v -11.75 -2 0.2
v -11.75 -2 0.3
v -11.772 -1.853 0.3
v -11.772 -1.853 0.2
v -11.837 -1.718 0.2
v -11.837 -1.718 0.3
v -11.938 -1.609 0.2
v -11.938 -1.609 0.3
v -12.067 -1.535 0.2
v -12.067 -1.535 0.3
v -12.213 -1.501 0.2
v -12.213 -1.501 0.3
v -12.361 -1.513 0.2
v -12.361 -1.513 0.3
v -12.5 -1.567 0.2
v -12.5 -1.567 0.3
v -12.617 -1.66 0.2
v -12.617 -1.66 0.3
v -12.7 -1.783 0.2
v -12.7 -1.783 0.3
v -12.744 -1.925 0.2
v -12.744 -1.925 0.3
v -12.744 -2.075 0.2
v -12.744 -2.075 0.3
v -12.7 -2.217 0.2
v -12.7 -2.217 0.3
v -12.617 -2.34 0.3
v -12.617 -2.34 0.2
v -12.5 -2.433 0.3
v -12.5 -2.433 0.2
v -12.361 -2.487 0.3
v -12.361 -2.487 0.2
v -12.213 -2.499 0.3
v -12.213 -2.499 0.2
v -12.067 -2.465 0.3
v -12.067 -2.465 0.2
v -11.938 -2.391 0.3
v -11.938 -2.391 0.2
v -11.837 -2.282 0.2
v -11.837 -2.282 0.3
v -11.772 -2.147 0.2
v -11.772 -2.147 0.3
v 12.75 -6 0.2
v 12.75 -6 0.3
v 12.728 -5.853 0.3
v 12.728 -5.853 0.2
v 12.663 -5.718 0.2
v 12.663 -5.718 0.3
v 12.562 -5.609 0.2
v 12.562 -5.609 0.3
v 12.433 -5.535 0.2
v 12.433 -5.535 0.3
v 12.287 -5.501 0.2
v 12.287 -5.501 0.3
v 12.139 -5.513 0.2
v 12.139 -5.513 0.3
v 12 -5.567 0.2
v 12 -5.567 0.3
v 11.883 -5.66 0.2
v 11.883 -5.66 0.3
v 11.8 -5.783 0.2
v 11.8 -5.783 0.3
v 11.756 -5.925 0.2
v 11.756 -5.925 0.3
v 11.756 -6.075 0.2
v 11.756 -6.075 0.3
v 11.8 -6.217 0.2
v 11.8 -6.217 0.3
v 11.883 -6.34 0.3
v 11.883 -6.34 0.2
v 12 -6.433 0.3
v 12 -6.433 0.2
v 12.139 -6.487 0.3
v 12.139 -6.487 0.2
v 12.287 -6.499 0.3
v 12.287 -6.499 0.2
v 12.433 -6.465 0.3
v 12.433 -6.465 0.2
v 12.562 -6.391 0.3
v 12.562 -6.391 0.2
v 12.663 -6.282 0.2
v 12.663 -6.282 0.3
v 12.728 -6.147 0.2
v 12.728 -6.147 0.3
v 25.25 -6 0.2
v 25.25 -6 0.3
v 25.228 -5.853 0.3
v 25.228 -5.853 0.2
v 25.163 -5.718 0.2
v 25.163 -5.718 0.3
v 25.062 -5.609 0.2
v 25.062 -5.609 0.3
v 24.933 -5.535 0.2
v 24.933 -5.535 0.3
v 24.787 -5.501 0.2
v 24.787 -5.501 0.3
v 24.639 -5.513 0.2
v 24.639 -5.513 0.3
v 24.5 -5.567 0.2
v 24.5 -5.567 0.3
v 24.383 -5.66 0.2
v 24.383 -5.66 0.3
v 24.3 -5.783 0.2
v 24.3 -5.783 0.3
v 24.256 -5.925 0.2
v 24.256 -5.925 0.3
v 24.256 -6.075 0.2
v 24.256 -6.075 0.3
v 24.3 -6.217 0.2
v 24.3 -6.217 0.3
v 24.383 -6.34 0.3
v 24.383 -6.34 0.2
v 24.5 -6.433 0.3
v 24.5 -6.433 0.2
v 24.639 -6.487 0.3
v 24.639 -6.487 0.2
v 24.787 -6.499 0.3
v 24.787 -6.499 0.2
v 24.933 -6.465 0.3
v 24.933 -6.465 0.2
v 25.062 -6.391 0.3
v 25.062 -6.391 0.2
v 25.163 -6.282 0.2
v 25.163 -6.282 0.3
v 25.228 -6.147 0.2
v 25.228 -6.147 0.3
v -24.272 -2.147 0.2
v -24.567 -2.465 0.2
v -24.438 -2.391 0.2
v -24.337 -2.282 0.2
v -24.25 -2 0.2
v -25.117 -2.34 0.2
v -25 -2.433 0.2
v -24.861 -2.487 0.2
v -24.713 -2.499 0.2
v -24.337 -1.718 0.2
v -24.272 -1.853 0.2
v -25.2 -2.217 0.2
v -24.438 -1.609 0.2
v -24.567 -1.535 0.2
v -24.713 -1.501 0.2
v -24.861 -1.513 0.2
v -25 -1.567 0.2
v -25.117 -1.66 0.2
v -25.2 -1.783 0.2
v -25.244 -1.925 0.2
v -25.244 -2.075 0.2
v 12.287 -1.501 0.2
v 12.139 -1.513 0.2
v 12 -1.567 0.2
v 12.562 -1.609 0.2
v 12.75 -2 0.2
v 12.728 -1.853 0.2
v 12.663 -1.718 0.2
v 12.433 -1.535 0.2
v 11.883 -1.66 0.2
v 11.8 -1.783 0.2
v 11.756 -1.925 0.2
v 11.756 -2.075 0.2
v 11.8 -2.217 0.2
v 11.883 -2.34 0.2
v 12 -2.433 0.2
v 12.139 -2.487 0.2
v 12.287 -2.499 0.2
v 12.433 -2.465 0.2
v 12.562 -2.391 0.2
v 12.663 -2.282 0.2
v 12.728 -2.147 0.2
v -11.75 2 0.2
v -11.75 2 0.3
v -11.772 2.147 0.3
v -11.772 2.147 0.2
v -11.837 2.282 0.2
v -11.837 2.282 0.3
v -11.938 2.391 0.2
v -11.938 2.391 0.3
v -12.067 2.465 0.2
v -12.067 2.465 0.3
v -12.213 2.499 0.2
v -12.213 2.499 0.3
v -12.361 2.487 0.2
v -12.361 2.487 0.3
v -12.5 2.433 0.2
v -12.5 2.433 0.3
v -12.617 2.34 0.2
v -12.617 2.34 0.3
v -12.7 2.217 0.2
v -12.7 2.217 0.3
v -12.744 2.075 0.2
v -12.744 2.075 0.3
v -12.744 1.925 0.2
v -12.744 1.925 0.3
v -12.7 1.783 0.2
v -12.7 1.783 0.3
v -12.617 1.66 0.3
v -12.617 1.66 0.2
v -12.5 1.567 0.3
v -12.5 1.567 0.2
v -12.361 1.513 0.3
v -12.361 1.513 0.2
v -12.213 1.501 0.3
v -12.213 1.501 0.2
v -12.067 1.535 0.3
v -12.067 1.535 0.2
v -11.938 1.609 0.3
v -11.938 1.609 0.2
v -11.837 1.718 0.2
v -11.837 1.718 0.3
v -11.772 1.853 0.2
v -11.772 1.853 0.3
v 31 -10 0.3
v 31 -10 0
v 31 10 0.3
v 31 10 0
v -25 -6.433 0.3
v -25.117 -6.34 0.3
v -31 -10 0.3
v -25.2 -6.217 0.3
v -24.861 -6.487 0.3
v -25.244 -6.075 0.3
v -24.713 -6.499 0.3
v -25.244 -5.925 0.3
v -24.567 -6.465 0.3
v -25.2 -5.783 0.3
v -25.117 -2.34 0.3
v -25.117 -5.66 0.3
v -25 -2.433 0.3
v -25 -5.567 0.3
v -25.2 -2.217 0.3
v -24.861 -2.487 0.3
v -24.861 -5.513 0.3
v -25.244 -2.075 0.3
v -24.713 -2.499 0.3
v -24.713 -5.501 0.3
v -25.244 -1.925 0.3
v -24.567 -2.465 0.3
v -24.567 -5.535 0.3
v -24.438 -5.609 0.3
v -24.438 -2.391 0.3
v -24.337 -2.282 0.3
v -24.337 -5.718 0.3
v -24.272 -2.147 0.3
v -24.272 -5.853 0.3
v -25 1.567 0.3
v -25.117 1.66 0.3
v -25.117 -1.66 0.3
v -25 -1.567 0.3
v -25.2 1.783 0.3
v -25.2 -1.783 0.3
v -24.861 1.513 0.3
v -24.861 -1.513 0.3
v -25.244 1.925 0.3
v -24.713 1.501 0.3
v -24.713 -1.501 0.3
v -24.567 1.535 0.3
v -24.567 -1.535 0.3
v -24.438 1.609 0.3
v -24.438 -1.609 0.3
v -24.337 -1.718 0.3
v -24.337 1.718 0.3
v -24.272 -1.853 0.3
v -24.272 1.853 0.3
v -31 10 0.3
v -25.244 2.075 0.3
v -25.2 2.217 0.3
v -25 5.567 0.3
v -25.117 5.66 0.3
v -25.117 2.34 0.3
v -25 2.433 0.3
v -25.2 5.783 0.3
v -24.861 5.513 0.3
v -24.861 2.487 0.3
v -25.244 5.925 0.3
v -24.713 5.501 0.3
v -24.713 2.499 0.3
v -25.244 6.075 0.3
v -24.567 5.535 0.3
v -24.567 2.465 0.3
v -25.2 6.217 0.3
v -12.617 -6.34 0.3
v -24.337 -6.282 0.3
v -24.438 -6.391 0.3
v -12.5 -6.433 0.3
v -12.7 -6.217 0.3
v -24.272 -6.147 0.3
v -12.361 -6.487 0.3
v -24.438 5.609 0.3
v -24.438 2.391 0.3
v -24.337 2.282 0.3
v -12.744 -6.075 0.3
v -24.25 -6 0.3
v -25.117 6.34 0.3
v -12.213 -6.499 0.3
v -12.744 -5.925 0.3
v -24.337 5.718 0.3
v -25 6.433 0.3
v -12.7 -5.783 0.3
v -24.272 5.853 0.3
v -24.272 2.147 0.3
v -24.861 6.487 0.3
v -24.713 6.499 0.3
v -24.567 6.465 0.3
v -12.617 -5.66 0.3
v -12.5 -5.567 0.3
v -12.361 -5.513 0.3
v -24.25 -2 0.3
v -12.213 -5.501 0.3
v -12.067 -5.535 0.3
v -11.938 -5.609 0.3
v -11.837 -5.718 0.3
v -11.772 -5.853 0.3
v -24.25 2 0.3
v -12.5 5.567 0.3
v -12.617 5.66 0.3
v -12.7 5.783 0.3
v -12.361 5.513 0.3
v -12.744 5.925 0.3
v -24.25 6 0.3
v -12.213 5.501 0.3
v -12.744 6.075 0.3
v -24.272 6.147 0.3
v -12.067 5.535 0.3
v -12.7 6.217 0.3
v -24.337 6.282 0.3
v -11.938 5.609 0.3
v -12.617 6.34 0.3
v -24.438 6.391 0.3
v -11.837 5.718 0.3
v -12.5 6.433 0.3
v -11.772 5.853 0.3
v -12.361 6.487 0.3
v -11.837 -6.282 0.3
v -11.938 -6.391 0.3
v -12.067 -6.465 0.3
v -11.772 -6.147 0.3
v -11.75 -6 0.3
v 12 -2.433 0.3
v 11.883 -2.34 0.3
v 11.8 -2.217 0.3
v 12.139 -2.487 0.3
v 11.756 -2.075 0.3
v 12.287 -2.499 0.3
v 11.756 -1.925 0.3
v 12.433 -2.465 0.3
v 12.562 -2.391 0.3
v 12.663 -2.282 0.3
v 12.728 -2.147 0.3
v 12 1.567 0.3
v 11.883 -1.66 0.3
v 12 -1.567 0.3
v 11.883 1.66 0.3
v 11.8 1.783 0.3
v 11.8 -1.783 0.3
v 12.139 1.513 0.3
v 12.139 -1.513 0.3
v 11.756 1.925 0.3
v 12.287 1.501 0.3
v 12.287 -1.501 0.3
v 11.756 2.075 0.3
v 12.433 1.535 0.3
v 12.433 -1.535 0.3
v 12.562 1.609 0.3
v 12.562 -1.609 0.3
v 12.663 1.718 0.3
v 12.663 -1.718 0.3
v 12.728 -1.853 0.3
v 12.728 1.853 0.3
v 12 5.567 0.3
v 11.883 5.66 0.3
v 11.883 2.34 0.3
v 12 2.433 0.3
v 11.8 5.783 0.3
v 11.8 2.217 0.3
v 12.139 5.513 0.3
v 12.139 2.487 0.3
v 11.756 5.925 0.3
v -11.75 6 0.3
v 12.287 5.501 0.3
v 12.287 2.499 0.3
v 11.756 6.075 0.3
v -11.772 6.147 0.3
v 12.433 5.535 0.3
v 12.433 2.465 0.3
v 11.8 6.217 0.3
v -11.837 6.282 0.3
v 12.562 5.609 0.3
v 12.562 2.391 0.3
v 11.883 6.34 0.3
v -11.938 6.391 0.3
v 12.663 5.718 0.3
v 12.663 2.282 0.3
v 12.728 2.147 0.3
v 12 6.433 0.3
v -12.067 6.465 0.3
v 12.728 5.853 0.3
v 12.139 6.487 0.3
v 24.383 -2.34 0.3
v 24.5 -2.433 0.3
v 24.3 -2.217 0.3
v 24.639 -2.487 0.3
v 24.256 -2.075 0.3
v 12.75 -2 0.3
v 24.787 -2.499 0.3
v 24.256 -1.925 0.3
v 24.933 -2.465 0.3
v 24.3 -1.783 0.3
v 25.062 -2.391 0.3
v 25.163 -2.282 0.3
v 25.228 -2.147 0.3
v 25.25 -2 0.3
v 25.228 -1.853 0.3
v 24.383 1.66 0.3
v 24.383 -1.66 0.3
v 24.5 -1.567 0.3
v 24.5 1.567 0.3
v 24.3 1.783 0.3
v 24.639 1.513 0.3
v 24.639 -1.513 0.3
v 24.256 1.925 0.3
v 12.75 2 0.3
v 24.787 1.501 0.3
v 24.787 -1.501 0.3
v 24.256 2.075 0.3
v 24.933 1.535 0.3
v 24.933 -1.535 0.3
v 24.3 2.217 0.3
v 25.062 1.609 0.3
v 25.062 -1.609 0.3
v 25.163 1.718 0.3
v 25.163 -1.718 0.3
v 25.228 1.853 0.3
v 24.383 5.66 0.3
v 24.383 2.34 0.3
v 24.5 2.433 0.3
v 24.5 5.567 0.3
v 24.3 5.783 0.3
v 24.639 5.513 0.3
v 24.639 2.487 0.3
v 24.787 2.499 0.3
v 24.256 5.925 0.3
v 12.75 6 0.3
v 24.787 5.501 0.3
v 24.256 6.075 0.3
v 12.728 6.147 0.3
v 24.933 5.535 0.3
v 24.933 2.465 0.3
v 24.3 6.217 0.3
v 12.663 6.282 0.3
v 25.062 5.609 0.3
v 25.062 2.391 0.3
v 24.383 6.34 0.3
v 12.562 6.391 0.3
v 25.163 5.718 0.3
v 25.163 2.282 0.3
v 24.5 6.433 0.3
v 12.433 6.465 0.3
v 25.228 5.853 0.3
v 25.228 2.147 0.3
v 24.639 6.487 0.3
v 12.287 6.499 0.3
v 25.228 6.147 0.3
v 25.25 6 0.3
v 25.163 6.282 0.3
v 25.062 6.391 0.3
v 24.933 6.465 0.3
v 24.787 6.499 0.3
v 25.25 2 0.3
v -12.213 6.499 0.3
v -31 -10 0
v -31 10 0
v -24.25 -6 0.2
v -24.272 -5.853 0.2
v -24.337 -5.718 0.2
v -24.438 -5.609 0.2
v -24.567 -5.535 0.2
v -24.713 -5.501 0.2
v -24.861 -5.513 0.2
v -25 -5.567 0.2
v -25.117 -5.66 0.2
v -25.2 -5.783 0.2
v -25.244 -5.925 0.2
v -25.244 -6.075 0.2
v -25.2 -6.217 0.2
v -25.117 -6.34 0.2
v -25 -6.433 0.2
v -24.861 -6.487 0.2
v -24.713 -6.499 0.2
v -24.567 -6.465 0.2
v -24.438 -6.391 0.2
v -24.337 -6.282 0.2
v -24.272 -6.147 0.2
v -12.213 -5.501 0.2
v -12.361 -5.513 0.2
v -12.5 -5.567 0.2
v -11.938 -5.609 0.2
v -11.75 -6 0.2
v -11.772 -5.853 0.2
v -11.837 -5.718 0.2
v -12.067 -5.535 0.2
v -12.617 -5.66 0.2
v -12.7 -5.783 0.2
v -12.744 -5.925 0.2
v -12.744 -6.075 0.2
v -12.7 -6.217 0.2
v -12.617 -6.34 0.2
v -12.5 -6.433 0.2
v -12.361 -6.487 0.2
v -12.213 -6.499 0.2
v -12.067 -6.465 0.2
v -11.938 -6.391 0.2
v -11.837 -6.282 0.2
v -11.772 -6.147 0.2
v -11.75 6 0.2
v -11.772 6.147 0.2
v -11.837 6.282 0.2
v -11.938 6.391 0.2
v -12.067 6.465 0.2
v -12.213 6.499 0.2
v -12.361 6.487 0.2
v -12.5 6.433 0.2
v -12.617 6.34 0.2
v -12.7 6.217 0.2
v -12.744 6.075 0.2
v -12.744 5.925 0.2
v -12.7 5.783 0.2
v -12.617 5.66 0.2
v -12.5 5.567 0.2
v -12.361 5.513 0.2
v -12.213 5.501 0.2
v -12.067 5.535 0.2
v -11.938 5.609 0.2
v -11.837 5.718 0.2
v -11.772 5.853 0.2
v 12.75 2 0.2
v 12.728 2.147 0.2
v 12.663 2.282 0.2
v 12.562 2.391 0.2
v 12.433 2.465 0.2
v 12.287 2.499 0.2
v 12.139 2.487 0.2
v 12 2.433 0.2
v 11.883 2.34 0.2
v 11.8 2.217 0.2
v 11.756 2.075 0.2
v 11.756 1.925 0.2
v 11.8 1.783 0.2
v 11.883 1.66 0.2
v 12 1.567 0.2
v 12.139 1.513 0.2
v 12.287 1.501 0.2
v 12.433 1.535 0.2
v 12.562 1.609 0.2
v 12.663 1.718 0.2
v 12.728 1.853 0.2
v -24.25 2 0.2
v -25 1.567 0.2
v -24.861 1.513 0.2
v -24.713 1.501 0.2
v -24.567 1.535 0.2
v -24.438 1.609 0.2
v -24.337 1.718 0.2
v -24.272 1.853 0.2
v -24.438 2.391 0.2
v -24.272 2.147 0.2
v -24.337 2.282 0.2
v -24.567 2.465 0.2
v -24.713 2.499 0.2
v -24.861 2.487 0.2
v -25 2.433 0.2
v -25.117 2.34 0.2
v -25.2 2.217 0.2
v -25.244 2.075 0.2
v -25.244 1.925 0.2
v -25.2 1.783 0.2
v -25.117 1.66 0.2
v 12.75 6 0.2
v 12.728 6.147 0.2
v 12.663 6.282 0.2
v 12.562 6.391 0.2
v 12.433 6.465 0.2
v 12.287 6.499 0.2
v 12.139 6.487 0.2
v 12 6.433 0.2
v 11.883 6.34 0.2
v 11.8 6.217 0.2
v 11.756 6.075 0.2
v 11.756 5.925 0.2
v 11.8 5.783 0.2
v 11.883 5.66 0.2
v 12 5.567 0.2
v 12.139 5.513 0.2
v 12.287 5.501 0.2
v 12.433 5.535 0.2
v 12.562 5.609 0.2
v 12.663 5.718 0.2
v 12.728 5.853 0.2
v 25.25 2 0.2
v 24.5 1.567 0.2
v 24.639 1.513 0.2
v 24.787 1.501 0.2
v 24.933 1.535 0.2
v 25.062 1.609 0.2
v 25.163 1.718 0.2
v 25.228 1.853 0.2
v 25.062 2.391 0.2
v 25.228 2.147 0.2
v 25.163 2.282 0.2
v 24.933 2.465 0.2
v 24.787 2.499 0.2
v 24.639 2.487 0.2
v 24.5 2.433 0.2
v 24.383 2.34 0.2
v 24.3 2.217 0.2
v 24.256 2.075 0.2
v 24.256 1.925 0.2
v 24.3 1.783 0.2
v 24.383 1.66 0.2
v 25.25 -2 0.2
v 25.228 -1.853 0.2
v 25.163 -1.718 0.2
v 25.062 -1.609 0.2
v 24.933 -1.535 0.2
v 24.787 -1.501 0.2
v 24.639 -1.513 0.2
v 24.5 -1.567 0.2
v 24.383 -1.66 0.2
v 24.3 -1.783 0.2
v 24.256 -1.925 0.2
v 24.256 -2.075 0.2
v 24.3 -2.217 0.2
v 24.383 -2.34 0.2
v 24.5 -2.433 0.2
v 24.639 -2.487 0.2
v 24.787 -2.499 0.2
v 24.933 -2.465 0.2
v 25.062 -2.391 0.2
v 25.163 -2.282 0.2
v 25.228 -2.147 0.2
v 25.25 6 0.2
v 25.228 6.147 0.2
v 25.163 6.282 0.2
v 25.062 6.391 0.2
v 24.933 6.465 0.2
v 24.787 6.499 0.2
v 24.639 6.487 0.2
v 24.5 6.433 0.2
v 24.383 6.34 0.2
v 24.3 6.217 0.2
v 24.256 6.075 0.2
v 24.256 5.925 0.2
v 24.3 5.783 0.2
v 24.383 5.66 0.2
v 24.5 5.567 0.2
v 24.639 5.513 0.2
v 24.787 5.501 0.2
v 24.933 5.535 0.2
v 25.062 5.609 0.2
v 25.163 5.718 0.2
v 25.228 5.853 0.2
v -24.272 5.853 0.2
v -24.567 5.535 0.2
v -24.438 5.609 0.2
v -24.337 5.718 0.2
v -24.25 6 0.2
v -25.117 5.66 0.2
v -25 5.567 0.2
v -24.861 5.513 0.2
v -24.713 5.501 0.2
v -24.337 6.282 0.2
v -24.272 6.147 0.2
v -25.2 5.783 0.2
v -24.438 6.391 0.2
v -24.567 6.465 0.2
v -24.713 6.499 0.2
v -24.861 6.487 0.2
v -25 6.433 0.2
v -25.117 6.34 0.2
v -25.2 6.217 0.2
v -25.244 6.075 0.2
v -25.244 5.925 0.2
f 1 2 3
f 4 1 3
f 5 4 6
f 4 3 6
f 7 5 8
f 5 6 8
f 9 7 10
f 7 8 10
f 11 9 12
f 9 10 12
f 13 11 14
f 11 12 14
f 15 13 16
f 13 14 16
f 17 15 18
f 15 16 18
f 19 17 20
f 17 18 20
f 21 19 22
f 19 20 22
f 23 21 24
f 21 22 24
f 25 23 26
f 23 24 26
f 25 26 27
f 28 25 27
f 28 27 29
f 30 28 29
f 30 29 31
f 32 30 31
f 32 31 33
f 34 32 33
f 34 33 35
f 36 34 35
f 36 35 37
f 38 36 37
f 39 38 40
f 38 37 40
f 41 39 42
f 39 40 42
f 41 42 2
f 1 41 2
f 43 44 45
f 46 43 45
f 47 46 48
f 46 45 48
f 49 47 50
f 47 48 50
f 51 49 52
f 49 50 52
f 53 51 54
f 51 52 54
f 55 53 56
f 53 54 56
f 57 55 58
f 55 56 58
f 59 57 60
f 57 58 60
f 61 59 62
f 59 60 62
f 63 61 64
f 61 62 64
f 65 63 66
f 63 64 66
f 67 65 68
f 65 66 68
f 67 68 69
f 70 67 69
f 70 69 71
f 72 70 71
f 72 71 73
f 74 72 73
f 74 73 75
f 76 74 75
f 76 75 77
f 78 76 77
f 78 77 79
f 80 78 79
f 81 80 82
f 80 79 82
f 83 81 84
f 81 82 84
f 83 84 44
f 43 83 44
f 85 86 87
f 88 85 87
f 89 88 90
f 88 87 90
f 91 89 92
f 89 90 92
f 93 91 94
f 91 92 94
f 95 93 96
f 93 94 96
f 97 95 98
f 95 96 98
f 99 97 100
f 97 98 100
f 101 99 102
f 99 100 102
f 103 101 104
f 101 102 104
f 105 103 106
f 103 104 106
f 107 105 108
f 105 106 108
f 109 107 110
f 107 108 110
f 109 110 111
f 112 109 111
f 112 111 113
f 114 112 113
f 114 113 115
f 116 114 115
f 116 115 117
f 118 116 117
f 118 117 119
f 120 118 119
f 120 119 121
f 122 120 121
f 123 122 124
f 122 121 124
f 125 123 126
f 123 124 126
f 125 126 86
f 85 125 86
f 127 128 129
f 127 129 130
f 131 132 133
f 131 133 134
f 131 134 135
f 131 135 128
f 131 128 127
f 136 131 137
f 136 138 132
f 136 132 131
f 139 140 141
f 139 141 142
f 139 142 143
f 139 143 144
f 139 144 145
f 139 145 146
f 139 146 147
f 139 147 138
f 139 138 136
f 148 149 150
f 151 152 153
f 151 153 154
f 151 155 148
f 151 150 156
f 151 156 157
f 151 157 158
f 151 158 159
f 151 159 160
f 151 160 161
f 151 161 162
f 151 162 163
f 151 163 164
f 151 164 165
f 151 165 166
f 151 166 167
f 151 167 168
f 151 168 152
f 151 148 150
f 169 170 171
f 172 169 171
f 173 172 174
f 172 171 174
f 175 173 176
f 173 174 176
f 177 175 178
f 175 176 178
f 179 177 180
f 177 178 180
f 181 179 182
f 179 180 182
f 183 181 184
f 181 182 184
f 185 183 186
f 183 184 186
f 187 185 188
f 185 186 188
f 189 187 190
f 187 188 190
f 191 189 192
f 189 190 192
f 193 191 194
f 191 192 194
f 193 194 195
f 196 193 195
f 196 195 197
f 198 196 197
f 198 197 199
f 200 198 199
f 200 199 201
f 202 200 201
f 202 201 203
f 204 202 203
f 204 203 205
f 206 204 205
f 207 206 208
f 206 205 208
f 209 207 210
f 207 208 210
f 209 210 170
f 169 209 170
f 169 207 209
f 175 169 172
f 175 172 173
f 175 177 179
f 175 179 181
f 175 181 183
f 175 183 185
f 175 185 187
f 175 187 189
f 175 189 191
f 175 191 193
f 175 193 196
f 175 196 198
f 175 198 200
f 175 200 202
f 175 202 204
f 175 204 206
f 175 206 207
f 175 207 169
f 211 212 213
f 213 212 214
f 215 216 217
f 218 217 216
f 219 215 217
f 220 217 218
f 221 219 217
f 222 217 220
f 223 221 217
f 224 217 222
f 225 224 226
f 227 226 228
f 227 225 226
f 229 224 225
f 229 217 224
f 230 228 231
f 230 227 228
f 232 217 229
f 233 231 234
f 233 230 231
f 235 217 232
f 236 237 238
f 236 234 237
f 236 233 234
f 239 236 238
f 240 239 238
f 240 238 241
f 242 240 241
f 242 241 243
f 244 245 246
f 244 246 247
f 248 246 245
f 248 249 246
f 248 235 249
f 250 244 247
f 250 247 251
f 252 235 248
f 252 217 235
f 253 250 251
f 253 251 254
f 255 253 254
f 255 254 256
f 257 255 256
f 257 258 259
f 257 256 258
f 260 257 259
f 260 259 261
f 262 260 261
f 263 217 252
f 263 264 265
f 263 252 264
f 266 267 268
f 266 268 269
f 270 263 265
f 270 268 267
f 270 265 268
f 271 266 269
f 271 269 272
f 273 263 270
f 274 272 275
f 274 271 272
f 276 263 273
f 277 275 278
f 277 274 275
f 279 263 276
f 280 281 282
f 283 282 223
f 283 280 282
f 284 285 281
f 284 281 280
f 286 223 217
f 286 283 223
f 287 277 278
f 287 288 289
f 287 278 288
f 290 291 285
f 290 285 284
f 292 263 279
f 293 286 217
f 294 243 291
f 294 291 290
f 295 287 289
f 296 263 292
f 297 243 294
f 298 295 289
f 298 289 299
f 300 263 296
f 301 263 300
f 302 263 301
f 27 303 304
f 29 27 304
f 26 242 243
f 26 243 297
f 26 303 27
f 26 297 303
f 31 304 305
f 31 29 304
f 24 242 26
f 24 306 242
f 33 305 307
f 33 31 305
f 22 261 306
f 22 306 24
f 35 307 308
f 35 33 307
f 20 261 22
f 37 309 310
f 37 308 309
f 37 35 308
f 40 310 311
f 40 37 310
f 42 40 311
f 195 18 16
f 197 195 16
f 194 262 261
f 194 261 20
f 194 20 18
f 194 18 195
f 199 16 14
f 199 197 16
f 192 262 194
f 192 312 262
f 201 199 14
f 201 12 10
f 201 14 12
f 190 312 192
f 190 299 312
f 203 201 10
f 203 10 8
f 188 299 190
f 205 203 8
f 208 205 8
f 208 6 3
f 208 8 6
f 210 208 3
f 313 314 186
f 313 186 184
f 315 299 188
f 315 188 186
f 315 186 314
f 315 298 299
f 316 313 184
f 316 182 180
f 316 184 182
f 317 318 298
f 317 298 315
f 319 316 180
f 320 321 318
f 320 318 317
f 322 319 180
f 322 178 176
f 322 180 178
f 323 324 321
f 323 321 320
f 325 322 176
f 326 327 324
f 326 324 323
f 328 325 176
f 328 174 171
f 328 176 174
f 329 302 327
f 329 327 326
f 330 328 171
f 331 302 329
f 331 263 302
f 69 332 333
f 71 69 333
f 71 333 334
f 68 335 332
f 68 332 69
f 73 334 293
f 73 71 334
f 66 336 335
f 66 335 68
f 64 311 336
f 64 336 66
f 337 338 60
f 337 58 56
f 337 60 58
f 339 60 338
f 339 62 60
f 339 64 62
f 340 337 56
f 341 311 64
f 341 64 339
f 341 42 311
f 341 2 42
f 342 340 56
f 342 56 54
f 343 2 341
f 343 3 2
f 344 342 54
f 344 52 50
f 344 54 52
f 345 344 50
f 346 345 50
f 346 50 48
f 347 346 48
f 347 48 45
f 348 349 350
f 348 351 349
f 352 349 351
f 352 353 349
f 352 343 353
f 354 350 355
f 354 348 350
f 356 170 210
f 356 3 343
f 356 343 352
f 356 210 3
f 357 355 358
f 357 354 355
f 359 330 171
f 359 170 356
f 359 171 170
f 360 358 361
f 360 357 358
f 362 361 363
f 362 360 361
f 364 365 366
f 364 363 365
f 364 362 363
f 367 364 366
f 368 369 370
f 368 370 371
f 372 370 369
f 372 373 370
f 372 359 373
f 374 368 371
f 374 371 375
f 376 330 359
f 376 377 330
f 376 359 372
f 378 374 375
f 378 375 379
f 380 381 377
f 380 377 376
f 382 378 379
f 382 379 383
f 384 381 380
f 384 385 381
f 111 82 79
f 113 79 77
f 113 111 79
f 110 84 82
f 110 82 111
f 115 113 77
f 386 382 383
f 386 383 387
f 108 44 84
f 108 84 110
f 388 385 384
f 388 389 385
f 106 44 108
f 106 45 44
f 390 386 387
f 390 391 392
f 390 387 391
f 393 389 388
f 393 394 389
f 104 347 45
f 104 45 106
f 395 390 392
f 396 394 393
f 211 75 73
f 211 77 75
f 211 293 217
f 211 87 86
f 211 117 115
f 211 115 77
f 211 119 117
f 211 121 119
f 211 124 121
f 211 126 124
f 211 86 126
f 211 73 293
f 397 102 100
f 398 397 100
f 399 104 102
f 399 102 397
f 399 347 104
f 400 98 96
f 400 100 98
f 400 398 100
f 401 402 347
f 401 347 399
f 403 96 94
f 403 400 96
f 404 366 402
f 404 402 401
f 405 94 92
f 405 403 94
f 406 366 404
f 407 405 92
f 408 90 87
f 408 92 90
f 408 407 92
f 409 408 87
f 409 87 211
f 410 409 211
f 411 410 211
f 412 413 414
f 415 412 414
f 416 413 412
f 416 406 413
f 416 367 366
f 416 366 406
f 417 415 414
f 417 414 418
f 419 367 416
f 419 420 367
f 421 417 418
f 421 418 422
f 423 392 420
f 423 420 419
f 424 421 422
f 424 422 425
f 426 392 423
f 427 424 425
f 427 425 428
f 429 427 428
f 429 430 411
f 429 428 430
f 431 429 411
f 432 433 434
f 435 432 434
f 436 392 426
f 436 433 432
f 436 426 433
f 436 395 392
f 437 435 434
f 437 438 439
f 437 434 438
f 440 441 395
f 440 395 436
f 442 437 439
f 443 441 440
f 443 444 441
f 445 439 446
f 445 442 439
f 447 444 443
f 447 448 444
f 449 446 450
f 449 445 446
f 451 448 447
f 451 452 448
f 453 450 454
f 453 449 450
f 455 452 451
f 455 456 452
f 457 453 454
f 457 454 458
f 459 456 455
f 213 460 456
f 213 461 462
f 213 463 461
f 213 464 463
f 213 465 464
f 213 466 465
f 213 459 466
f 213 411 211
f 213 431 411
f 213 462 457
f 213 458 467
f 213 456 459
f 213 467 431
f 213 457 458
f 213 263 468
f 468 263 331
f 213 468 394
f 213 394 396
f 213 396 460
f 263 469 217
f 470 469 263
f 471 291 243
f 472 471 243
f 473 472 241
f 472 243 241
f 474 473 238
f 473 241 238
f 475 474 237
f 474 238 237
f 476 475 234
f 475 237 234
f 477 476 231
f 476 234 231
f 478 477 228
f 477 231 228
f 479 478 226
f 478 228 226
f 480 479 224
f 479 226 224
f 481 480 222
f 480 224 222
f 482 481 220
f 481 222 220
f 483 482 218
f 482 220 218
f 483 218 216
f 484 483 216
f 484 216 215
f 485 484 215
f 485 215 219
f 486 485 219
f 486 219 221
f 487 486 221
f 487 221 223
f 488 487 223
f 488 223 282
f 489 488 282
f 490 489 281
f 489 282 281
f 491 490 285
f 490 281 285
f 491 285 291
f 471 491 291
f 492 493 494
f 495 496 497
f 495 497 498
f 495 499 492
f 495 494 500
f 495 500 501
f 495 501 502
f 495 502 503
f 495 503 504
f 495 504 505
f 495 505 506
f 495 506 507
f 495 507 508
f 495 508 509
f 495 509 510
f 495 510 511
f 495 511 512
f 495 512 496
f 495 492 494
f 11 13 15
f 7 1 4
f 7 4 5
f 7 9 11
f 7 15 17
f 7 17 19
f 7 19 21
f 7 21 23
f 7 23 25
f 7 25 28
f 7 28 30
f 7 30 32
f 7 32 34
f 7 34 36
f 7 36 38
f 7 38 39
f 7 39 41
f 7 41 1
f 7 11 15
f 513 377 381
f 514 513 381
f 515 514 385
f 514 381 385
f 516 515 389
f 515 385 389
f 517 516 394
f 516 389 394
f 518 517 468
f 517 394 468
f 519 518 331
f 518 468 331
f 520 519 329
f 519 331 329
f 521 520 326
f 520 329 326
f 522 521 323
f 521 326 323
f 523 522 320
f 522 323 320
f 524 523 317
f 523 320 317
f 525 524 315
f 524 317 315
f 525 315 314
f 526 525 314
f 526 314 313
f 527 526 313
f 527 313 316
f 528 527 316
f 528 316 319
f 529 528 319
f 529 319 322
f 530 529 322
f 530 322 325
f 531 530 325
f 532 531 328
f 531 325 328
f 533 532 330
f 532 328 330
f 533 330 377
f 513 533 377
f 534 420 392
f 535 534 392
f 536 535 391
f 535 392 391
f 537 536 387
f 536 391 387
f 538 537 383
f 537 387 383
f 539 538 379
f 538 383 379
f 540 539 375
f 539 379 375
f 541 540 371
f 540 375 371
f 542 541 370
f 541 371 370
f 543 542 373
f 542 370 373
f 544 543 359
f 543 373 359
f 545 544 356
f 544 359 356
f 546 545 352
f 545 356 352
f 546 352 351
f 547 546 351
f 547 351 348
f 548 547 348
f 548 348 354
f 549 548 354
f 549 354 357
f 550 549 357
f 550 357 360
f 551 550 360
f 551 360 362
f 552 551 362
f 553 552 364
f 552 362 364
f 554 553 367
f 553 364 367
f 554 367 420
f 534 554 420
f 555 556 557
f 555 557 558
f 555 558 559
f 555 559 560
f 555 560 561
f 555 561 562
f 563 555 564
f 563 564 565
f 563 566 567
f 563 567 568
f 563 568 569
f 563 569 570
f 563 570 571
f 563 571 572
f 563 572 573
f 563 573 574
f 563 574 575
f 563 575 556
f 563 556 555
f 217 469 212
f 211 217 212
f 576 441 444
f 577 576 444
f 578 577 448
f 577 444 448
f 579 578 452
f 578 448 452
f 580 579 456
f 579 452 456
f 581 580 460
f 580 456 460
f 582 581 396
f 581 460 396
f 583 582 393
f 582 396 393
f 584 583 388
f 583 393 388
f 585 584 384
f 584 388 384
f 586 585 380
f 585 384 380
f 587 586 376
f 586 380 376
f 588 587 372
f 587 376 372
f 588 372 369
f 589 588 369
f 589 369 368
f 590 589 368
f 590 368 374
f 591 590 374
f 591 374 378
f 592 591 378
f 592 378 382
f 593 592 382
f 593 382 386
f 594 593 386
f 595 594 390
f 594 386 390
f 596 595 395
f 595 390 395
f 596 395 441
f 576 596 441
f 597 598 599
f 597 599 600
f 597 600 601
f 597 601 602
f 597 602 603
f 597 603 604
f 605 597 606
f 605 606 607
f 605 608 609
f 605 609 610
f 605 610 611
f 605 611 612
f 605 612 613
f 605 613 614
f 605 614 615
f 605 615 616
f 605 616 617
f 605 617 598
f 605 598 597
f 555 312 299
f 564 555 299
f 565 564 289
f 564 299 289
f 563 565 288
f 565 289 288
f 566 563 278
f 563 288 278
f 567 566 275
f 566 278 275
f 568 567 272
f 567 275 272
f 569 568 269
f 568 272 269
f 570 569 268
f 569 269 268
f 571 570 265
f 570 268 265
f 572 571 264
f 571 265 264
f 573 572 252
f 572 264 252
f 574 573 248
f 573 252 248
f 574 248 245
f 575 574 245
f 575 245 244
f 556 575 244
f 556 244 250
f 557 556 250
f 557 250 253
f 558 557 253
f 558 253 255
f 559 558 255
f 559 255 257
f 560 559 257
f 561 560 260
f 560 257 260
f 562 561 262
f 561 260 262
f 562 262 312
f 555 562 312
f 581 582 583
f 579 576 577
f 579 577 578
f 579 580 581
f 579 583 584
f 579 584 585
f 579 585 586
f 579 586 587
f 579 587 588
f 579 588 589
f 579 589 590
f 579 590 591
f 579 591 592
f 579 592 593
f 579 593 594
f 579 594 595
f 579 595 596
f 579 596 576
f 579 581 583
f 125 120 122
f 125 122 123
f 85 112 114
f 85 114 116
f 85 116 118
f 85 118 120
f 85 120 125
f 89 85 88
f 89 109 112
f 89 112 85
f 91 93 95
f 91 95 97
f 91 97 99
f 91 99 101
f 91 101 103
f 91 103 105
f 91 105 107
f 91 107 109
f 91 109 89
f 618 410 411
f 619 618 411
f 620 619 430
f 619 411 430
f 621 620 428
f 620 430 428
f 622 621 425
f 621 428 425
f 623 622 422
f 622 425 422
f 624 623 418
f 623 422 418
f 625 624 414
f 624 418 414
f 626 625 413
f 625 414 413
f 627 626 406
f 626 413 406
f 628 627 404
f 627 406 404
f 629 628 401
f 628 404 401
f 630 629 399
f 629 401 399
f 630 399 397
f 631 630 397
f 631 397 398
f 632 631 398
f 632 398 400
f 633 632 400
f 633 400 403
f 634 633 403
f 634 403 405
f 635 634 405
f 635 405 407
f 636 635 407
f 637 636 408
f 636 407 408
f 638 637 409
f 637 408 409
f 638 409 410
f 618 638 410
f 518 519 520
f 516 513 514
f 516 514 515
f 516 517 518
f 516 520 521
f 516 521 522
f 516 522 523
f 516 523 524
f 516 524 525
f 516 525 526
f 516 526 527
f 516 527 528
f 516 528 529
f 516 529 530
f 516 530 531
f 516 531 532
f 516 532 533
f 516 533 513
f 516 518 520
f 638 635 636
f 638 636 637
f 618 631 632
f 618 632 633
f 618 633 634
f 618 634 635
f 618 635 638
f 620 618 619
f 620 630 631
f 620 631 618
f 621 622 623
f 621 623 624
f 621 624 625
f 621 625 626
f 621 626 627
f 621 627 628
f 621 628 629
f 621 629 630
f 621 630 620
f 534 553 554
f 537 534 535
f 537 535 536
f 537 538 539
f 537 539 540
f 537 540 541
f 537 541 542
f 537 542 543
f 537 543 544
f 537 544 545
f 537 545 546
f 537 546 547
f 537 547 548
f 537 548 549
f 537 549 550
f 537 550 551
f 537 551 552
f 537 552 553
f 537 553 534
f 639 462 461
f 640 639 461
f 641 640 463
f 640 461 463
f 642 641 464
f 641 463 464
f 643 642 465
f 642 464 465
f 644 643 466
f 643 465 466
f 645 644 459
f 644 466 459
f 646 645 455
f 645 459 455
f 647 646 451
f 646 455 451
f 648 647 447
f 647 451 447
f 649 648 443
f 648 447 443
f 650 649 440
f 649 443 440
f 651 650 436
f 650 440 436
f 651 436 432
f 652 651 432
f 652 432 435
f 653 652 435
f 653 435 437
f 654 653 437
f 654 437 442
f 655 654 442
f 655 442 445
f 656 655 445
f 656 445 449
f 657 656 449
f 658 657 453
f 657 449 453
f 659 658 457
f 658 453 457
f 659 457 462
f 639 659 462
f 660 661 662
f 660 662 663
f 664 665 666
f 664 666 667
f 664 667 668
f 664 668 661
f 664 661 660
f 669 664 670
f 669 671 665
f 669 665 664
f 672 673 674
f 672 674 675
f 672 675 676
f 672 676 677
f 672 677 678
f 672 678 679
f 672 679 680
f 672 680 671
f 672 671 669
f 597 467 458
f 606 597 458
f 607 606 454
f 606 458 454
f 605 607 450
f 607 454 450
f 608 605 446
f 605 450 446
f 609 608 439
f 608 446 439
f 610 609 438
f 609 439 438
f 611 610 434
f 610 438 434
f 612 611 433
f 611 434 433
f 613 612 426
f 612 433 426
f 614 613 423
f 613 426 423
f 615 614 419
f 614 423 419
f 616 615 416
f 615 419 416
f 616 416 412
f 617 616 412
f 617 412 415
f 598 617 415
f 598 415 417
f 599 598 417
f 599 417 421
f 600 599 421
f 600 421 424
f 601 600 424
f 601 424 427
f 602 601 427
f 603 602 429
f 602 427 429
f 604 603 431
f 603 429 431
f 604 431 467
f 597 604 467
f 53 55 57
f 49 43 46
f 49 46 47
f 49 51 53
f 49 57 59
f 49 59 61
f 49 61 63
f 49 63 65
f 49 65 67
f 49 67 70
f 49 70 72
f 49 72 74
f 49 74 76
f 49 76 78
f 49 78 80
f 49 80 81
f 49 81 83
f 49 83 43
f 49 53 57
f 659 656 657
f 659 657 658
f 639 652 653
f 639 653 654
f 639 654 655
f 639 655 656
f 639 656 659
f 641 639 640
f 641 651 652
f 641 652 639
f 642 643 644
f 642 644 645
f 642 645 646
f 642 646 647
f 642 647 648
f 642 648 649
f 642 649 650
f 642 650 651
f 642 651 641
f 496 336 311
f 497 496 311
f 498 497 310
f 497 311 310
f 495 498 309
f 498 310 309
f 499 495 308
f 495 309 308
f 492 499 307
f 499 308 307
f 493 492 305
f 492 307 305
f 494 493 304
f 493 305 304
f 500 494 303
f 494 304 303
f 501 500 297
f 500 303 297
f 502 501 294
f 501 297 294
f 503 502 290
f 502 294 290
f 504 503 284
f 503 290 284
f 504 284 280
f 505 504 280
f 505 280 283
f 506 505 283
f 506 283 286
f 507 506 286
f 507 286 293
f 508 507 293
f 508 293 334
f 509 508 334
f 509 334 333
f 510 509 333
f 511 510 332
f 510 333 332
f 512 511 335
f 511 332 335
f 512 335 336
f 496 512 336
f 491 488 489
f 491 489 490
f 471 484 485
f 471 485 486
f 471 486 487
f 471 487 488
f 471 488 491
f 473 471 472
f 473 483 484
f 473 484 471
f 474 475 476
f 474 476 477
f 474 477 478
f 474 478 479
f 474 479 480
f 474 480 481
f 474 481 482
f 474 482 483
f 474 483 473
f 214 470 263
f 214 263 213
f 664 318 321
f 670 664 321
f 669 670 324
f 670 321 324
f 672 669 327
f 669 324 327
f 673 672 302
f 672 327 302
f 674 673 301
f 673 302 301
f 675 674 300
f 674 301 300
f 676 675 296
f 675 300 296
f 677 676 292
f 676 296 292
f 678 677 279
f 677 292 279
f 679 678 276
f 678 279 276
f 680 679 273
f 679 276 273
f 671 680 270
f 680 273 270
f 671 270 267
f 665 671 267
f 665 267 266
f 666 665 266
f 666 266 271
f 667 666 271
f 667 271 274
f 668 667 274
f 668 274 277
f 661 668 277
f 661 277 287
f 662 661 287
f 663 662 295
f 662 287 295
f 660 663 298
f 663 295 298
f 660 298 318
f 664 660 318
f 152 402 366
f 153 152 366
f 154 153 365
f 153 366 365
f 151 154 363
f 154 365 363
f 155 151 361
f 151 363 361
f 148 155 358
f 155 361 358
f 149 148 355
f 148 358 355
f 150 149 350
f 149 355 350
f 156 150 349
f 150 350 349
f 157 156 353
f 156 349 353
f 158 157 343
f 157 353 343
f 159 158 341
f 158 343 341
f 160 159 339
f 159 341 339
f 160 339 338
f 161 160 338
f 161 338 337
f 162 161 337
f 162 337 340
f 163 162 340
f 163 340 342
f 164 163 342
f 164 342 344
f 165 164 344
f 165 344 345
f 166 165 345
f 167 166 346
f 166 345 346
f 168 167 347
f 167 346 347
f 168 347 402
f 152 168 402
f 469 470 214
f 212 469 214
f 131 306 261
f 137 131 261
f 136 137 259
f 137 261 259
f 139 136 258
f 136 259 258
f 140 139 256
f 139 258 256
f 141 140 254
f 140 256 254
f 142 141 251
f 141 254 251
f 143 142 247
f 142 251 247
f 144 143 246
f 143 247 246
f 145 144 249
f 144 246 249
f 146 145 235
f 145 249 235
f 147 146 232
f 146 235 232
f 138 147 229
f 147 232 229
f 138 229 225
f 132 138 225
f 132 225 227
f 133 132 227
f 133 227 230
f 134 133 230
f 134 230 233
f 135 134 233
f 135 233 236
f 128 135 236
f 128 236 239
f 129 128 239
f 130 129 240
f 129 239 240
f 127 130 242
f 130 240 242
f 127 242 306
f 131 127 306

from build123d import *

# Parameters (mm, degrees)
SZKIC1_W                    = 62
SZKIC1_H                    = 20
DODANIE_WYCI_GNI_CIE1_DEPTH = 0.3
SZKIC2_R                    = 0.5
WYTNIJ_WYCI_GNI_CIE1_DEPTH  = 0.1


with BuildPart() as part:
    # Szkic1 → Dodanie-wyciągnięcie1 (new body)
    with BuildSketch(Plane.XY):
        Rectangle(SZKIC1_W, SZKIC1_H)
    extrude(amount=DODANIE_WYCI_GNI_CIE1_DEPTH)

    # Szkic2 → Wytnij-wyciągnięcie1 (cut)
    with BuildSketch(Plane.XY.offset(0.3)):
        with Locations((-24.75, 2)):
            Circle(SZKIC2_R)
        with Locations((-24.75, -2)):
            Circle(SZKIC2_R)
        with Locations((-12.25, 2)):
            Circle(SZKIC2_R)
        with Locations((-12.25, -2)):
            Circle(SZKIC2_R)
        with Locations((12.25, -2)):
            Circle(SZKIC2_R)
        with Locations((12.25, 2)):
            Circle(SZKIC2_R)
        with Locations((24.75, -2)):
            Circle(SZKIC2_R)
        with Locations((24.75, 2)):
            Circle(SZKIC2_R)
        with Locations((-24.75, 6)):
            Circle(SZKIC2_R)
        with Locations((-12.25, 6)):
            Circle(SZKIC2_R)
        with Locations((-24.75, -6)):
            Circle(SZKIC2_R)
        with Locations((-12.25, -6)):
            Circle(SZKIC2_R)
        with Locations((24.75, -6)):
            Circle(SZKIC2_R)
        with Locations((12.25, -6)):
            Circle(SZKIC2_R)
        with Locations((12.25, 6)):
            Circle(SZKIC2_R)
        with Locations((24.75, 6)):
            Circle(SZKIC2_R)
    extrude(amount=-WYTNIJ_WYCI_GNI_CIE1_DEPTH, mode=Mode.SUBTRACT)


solid = part.part
